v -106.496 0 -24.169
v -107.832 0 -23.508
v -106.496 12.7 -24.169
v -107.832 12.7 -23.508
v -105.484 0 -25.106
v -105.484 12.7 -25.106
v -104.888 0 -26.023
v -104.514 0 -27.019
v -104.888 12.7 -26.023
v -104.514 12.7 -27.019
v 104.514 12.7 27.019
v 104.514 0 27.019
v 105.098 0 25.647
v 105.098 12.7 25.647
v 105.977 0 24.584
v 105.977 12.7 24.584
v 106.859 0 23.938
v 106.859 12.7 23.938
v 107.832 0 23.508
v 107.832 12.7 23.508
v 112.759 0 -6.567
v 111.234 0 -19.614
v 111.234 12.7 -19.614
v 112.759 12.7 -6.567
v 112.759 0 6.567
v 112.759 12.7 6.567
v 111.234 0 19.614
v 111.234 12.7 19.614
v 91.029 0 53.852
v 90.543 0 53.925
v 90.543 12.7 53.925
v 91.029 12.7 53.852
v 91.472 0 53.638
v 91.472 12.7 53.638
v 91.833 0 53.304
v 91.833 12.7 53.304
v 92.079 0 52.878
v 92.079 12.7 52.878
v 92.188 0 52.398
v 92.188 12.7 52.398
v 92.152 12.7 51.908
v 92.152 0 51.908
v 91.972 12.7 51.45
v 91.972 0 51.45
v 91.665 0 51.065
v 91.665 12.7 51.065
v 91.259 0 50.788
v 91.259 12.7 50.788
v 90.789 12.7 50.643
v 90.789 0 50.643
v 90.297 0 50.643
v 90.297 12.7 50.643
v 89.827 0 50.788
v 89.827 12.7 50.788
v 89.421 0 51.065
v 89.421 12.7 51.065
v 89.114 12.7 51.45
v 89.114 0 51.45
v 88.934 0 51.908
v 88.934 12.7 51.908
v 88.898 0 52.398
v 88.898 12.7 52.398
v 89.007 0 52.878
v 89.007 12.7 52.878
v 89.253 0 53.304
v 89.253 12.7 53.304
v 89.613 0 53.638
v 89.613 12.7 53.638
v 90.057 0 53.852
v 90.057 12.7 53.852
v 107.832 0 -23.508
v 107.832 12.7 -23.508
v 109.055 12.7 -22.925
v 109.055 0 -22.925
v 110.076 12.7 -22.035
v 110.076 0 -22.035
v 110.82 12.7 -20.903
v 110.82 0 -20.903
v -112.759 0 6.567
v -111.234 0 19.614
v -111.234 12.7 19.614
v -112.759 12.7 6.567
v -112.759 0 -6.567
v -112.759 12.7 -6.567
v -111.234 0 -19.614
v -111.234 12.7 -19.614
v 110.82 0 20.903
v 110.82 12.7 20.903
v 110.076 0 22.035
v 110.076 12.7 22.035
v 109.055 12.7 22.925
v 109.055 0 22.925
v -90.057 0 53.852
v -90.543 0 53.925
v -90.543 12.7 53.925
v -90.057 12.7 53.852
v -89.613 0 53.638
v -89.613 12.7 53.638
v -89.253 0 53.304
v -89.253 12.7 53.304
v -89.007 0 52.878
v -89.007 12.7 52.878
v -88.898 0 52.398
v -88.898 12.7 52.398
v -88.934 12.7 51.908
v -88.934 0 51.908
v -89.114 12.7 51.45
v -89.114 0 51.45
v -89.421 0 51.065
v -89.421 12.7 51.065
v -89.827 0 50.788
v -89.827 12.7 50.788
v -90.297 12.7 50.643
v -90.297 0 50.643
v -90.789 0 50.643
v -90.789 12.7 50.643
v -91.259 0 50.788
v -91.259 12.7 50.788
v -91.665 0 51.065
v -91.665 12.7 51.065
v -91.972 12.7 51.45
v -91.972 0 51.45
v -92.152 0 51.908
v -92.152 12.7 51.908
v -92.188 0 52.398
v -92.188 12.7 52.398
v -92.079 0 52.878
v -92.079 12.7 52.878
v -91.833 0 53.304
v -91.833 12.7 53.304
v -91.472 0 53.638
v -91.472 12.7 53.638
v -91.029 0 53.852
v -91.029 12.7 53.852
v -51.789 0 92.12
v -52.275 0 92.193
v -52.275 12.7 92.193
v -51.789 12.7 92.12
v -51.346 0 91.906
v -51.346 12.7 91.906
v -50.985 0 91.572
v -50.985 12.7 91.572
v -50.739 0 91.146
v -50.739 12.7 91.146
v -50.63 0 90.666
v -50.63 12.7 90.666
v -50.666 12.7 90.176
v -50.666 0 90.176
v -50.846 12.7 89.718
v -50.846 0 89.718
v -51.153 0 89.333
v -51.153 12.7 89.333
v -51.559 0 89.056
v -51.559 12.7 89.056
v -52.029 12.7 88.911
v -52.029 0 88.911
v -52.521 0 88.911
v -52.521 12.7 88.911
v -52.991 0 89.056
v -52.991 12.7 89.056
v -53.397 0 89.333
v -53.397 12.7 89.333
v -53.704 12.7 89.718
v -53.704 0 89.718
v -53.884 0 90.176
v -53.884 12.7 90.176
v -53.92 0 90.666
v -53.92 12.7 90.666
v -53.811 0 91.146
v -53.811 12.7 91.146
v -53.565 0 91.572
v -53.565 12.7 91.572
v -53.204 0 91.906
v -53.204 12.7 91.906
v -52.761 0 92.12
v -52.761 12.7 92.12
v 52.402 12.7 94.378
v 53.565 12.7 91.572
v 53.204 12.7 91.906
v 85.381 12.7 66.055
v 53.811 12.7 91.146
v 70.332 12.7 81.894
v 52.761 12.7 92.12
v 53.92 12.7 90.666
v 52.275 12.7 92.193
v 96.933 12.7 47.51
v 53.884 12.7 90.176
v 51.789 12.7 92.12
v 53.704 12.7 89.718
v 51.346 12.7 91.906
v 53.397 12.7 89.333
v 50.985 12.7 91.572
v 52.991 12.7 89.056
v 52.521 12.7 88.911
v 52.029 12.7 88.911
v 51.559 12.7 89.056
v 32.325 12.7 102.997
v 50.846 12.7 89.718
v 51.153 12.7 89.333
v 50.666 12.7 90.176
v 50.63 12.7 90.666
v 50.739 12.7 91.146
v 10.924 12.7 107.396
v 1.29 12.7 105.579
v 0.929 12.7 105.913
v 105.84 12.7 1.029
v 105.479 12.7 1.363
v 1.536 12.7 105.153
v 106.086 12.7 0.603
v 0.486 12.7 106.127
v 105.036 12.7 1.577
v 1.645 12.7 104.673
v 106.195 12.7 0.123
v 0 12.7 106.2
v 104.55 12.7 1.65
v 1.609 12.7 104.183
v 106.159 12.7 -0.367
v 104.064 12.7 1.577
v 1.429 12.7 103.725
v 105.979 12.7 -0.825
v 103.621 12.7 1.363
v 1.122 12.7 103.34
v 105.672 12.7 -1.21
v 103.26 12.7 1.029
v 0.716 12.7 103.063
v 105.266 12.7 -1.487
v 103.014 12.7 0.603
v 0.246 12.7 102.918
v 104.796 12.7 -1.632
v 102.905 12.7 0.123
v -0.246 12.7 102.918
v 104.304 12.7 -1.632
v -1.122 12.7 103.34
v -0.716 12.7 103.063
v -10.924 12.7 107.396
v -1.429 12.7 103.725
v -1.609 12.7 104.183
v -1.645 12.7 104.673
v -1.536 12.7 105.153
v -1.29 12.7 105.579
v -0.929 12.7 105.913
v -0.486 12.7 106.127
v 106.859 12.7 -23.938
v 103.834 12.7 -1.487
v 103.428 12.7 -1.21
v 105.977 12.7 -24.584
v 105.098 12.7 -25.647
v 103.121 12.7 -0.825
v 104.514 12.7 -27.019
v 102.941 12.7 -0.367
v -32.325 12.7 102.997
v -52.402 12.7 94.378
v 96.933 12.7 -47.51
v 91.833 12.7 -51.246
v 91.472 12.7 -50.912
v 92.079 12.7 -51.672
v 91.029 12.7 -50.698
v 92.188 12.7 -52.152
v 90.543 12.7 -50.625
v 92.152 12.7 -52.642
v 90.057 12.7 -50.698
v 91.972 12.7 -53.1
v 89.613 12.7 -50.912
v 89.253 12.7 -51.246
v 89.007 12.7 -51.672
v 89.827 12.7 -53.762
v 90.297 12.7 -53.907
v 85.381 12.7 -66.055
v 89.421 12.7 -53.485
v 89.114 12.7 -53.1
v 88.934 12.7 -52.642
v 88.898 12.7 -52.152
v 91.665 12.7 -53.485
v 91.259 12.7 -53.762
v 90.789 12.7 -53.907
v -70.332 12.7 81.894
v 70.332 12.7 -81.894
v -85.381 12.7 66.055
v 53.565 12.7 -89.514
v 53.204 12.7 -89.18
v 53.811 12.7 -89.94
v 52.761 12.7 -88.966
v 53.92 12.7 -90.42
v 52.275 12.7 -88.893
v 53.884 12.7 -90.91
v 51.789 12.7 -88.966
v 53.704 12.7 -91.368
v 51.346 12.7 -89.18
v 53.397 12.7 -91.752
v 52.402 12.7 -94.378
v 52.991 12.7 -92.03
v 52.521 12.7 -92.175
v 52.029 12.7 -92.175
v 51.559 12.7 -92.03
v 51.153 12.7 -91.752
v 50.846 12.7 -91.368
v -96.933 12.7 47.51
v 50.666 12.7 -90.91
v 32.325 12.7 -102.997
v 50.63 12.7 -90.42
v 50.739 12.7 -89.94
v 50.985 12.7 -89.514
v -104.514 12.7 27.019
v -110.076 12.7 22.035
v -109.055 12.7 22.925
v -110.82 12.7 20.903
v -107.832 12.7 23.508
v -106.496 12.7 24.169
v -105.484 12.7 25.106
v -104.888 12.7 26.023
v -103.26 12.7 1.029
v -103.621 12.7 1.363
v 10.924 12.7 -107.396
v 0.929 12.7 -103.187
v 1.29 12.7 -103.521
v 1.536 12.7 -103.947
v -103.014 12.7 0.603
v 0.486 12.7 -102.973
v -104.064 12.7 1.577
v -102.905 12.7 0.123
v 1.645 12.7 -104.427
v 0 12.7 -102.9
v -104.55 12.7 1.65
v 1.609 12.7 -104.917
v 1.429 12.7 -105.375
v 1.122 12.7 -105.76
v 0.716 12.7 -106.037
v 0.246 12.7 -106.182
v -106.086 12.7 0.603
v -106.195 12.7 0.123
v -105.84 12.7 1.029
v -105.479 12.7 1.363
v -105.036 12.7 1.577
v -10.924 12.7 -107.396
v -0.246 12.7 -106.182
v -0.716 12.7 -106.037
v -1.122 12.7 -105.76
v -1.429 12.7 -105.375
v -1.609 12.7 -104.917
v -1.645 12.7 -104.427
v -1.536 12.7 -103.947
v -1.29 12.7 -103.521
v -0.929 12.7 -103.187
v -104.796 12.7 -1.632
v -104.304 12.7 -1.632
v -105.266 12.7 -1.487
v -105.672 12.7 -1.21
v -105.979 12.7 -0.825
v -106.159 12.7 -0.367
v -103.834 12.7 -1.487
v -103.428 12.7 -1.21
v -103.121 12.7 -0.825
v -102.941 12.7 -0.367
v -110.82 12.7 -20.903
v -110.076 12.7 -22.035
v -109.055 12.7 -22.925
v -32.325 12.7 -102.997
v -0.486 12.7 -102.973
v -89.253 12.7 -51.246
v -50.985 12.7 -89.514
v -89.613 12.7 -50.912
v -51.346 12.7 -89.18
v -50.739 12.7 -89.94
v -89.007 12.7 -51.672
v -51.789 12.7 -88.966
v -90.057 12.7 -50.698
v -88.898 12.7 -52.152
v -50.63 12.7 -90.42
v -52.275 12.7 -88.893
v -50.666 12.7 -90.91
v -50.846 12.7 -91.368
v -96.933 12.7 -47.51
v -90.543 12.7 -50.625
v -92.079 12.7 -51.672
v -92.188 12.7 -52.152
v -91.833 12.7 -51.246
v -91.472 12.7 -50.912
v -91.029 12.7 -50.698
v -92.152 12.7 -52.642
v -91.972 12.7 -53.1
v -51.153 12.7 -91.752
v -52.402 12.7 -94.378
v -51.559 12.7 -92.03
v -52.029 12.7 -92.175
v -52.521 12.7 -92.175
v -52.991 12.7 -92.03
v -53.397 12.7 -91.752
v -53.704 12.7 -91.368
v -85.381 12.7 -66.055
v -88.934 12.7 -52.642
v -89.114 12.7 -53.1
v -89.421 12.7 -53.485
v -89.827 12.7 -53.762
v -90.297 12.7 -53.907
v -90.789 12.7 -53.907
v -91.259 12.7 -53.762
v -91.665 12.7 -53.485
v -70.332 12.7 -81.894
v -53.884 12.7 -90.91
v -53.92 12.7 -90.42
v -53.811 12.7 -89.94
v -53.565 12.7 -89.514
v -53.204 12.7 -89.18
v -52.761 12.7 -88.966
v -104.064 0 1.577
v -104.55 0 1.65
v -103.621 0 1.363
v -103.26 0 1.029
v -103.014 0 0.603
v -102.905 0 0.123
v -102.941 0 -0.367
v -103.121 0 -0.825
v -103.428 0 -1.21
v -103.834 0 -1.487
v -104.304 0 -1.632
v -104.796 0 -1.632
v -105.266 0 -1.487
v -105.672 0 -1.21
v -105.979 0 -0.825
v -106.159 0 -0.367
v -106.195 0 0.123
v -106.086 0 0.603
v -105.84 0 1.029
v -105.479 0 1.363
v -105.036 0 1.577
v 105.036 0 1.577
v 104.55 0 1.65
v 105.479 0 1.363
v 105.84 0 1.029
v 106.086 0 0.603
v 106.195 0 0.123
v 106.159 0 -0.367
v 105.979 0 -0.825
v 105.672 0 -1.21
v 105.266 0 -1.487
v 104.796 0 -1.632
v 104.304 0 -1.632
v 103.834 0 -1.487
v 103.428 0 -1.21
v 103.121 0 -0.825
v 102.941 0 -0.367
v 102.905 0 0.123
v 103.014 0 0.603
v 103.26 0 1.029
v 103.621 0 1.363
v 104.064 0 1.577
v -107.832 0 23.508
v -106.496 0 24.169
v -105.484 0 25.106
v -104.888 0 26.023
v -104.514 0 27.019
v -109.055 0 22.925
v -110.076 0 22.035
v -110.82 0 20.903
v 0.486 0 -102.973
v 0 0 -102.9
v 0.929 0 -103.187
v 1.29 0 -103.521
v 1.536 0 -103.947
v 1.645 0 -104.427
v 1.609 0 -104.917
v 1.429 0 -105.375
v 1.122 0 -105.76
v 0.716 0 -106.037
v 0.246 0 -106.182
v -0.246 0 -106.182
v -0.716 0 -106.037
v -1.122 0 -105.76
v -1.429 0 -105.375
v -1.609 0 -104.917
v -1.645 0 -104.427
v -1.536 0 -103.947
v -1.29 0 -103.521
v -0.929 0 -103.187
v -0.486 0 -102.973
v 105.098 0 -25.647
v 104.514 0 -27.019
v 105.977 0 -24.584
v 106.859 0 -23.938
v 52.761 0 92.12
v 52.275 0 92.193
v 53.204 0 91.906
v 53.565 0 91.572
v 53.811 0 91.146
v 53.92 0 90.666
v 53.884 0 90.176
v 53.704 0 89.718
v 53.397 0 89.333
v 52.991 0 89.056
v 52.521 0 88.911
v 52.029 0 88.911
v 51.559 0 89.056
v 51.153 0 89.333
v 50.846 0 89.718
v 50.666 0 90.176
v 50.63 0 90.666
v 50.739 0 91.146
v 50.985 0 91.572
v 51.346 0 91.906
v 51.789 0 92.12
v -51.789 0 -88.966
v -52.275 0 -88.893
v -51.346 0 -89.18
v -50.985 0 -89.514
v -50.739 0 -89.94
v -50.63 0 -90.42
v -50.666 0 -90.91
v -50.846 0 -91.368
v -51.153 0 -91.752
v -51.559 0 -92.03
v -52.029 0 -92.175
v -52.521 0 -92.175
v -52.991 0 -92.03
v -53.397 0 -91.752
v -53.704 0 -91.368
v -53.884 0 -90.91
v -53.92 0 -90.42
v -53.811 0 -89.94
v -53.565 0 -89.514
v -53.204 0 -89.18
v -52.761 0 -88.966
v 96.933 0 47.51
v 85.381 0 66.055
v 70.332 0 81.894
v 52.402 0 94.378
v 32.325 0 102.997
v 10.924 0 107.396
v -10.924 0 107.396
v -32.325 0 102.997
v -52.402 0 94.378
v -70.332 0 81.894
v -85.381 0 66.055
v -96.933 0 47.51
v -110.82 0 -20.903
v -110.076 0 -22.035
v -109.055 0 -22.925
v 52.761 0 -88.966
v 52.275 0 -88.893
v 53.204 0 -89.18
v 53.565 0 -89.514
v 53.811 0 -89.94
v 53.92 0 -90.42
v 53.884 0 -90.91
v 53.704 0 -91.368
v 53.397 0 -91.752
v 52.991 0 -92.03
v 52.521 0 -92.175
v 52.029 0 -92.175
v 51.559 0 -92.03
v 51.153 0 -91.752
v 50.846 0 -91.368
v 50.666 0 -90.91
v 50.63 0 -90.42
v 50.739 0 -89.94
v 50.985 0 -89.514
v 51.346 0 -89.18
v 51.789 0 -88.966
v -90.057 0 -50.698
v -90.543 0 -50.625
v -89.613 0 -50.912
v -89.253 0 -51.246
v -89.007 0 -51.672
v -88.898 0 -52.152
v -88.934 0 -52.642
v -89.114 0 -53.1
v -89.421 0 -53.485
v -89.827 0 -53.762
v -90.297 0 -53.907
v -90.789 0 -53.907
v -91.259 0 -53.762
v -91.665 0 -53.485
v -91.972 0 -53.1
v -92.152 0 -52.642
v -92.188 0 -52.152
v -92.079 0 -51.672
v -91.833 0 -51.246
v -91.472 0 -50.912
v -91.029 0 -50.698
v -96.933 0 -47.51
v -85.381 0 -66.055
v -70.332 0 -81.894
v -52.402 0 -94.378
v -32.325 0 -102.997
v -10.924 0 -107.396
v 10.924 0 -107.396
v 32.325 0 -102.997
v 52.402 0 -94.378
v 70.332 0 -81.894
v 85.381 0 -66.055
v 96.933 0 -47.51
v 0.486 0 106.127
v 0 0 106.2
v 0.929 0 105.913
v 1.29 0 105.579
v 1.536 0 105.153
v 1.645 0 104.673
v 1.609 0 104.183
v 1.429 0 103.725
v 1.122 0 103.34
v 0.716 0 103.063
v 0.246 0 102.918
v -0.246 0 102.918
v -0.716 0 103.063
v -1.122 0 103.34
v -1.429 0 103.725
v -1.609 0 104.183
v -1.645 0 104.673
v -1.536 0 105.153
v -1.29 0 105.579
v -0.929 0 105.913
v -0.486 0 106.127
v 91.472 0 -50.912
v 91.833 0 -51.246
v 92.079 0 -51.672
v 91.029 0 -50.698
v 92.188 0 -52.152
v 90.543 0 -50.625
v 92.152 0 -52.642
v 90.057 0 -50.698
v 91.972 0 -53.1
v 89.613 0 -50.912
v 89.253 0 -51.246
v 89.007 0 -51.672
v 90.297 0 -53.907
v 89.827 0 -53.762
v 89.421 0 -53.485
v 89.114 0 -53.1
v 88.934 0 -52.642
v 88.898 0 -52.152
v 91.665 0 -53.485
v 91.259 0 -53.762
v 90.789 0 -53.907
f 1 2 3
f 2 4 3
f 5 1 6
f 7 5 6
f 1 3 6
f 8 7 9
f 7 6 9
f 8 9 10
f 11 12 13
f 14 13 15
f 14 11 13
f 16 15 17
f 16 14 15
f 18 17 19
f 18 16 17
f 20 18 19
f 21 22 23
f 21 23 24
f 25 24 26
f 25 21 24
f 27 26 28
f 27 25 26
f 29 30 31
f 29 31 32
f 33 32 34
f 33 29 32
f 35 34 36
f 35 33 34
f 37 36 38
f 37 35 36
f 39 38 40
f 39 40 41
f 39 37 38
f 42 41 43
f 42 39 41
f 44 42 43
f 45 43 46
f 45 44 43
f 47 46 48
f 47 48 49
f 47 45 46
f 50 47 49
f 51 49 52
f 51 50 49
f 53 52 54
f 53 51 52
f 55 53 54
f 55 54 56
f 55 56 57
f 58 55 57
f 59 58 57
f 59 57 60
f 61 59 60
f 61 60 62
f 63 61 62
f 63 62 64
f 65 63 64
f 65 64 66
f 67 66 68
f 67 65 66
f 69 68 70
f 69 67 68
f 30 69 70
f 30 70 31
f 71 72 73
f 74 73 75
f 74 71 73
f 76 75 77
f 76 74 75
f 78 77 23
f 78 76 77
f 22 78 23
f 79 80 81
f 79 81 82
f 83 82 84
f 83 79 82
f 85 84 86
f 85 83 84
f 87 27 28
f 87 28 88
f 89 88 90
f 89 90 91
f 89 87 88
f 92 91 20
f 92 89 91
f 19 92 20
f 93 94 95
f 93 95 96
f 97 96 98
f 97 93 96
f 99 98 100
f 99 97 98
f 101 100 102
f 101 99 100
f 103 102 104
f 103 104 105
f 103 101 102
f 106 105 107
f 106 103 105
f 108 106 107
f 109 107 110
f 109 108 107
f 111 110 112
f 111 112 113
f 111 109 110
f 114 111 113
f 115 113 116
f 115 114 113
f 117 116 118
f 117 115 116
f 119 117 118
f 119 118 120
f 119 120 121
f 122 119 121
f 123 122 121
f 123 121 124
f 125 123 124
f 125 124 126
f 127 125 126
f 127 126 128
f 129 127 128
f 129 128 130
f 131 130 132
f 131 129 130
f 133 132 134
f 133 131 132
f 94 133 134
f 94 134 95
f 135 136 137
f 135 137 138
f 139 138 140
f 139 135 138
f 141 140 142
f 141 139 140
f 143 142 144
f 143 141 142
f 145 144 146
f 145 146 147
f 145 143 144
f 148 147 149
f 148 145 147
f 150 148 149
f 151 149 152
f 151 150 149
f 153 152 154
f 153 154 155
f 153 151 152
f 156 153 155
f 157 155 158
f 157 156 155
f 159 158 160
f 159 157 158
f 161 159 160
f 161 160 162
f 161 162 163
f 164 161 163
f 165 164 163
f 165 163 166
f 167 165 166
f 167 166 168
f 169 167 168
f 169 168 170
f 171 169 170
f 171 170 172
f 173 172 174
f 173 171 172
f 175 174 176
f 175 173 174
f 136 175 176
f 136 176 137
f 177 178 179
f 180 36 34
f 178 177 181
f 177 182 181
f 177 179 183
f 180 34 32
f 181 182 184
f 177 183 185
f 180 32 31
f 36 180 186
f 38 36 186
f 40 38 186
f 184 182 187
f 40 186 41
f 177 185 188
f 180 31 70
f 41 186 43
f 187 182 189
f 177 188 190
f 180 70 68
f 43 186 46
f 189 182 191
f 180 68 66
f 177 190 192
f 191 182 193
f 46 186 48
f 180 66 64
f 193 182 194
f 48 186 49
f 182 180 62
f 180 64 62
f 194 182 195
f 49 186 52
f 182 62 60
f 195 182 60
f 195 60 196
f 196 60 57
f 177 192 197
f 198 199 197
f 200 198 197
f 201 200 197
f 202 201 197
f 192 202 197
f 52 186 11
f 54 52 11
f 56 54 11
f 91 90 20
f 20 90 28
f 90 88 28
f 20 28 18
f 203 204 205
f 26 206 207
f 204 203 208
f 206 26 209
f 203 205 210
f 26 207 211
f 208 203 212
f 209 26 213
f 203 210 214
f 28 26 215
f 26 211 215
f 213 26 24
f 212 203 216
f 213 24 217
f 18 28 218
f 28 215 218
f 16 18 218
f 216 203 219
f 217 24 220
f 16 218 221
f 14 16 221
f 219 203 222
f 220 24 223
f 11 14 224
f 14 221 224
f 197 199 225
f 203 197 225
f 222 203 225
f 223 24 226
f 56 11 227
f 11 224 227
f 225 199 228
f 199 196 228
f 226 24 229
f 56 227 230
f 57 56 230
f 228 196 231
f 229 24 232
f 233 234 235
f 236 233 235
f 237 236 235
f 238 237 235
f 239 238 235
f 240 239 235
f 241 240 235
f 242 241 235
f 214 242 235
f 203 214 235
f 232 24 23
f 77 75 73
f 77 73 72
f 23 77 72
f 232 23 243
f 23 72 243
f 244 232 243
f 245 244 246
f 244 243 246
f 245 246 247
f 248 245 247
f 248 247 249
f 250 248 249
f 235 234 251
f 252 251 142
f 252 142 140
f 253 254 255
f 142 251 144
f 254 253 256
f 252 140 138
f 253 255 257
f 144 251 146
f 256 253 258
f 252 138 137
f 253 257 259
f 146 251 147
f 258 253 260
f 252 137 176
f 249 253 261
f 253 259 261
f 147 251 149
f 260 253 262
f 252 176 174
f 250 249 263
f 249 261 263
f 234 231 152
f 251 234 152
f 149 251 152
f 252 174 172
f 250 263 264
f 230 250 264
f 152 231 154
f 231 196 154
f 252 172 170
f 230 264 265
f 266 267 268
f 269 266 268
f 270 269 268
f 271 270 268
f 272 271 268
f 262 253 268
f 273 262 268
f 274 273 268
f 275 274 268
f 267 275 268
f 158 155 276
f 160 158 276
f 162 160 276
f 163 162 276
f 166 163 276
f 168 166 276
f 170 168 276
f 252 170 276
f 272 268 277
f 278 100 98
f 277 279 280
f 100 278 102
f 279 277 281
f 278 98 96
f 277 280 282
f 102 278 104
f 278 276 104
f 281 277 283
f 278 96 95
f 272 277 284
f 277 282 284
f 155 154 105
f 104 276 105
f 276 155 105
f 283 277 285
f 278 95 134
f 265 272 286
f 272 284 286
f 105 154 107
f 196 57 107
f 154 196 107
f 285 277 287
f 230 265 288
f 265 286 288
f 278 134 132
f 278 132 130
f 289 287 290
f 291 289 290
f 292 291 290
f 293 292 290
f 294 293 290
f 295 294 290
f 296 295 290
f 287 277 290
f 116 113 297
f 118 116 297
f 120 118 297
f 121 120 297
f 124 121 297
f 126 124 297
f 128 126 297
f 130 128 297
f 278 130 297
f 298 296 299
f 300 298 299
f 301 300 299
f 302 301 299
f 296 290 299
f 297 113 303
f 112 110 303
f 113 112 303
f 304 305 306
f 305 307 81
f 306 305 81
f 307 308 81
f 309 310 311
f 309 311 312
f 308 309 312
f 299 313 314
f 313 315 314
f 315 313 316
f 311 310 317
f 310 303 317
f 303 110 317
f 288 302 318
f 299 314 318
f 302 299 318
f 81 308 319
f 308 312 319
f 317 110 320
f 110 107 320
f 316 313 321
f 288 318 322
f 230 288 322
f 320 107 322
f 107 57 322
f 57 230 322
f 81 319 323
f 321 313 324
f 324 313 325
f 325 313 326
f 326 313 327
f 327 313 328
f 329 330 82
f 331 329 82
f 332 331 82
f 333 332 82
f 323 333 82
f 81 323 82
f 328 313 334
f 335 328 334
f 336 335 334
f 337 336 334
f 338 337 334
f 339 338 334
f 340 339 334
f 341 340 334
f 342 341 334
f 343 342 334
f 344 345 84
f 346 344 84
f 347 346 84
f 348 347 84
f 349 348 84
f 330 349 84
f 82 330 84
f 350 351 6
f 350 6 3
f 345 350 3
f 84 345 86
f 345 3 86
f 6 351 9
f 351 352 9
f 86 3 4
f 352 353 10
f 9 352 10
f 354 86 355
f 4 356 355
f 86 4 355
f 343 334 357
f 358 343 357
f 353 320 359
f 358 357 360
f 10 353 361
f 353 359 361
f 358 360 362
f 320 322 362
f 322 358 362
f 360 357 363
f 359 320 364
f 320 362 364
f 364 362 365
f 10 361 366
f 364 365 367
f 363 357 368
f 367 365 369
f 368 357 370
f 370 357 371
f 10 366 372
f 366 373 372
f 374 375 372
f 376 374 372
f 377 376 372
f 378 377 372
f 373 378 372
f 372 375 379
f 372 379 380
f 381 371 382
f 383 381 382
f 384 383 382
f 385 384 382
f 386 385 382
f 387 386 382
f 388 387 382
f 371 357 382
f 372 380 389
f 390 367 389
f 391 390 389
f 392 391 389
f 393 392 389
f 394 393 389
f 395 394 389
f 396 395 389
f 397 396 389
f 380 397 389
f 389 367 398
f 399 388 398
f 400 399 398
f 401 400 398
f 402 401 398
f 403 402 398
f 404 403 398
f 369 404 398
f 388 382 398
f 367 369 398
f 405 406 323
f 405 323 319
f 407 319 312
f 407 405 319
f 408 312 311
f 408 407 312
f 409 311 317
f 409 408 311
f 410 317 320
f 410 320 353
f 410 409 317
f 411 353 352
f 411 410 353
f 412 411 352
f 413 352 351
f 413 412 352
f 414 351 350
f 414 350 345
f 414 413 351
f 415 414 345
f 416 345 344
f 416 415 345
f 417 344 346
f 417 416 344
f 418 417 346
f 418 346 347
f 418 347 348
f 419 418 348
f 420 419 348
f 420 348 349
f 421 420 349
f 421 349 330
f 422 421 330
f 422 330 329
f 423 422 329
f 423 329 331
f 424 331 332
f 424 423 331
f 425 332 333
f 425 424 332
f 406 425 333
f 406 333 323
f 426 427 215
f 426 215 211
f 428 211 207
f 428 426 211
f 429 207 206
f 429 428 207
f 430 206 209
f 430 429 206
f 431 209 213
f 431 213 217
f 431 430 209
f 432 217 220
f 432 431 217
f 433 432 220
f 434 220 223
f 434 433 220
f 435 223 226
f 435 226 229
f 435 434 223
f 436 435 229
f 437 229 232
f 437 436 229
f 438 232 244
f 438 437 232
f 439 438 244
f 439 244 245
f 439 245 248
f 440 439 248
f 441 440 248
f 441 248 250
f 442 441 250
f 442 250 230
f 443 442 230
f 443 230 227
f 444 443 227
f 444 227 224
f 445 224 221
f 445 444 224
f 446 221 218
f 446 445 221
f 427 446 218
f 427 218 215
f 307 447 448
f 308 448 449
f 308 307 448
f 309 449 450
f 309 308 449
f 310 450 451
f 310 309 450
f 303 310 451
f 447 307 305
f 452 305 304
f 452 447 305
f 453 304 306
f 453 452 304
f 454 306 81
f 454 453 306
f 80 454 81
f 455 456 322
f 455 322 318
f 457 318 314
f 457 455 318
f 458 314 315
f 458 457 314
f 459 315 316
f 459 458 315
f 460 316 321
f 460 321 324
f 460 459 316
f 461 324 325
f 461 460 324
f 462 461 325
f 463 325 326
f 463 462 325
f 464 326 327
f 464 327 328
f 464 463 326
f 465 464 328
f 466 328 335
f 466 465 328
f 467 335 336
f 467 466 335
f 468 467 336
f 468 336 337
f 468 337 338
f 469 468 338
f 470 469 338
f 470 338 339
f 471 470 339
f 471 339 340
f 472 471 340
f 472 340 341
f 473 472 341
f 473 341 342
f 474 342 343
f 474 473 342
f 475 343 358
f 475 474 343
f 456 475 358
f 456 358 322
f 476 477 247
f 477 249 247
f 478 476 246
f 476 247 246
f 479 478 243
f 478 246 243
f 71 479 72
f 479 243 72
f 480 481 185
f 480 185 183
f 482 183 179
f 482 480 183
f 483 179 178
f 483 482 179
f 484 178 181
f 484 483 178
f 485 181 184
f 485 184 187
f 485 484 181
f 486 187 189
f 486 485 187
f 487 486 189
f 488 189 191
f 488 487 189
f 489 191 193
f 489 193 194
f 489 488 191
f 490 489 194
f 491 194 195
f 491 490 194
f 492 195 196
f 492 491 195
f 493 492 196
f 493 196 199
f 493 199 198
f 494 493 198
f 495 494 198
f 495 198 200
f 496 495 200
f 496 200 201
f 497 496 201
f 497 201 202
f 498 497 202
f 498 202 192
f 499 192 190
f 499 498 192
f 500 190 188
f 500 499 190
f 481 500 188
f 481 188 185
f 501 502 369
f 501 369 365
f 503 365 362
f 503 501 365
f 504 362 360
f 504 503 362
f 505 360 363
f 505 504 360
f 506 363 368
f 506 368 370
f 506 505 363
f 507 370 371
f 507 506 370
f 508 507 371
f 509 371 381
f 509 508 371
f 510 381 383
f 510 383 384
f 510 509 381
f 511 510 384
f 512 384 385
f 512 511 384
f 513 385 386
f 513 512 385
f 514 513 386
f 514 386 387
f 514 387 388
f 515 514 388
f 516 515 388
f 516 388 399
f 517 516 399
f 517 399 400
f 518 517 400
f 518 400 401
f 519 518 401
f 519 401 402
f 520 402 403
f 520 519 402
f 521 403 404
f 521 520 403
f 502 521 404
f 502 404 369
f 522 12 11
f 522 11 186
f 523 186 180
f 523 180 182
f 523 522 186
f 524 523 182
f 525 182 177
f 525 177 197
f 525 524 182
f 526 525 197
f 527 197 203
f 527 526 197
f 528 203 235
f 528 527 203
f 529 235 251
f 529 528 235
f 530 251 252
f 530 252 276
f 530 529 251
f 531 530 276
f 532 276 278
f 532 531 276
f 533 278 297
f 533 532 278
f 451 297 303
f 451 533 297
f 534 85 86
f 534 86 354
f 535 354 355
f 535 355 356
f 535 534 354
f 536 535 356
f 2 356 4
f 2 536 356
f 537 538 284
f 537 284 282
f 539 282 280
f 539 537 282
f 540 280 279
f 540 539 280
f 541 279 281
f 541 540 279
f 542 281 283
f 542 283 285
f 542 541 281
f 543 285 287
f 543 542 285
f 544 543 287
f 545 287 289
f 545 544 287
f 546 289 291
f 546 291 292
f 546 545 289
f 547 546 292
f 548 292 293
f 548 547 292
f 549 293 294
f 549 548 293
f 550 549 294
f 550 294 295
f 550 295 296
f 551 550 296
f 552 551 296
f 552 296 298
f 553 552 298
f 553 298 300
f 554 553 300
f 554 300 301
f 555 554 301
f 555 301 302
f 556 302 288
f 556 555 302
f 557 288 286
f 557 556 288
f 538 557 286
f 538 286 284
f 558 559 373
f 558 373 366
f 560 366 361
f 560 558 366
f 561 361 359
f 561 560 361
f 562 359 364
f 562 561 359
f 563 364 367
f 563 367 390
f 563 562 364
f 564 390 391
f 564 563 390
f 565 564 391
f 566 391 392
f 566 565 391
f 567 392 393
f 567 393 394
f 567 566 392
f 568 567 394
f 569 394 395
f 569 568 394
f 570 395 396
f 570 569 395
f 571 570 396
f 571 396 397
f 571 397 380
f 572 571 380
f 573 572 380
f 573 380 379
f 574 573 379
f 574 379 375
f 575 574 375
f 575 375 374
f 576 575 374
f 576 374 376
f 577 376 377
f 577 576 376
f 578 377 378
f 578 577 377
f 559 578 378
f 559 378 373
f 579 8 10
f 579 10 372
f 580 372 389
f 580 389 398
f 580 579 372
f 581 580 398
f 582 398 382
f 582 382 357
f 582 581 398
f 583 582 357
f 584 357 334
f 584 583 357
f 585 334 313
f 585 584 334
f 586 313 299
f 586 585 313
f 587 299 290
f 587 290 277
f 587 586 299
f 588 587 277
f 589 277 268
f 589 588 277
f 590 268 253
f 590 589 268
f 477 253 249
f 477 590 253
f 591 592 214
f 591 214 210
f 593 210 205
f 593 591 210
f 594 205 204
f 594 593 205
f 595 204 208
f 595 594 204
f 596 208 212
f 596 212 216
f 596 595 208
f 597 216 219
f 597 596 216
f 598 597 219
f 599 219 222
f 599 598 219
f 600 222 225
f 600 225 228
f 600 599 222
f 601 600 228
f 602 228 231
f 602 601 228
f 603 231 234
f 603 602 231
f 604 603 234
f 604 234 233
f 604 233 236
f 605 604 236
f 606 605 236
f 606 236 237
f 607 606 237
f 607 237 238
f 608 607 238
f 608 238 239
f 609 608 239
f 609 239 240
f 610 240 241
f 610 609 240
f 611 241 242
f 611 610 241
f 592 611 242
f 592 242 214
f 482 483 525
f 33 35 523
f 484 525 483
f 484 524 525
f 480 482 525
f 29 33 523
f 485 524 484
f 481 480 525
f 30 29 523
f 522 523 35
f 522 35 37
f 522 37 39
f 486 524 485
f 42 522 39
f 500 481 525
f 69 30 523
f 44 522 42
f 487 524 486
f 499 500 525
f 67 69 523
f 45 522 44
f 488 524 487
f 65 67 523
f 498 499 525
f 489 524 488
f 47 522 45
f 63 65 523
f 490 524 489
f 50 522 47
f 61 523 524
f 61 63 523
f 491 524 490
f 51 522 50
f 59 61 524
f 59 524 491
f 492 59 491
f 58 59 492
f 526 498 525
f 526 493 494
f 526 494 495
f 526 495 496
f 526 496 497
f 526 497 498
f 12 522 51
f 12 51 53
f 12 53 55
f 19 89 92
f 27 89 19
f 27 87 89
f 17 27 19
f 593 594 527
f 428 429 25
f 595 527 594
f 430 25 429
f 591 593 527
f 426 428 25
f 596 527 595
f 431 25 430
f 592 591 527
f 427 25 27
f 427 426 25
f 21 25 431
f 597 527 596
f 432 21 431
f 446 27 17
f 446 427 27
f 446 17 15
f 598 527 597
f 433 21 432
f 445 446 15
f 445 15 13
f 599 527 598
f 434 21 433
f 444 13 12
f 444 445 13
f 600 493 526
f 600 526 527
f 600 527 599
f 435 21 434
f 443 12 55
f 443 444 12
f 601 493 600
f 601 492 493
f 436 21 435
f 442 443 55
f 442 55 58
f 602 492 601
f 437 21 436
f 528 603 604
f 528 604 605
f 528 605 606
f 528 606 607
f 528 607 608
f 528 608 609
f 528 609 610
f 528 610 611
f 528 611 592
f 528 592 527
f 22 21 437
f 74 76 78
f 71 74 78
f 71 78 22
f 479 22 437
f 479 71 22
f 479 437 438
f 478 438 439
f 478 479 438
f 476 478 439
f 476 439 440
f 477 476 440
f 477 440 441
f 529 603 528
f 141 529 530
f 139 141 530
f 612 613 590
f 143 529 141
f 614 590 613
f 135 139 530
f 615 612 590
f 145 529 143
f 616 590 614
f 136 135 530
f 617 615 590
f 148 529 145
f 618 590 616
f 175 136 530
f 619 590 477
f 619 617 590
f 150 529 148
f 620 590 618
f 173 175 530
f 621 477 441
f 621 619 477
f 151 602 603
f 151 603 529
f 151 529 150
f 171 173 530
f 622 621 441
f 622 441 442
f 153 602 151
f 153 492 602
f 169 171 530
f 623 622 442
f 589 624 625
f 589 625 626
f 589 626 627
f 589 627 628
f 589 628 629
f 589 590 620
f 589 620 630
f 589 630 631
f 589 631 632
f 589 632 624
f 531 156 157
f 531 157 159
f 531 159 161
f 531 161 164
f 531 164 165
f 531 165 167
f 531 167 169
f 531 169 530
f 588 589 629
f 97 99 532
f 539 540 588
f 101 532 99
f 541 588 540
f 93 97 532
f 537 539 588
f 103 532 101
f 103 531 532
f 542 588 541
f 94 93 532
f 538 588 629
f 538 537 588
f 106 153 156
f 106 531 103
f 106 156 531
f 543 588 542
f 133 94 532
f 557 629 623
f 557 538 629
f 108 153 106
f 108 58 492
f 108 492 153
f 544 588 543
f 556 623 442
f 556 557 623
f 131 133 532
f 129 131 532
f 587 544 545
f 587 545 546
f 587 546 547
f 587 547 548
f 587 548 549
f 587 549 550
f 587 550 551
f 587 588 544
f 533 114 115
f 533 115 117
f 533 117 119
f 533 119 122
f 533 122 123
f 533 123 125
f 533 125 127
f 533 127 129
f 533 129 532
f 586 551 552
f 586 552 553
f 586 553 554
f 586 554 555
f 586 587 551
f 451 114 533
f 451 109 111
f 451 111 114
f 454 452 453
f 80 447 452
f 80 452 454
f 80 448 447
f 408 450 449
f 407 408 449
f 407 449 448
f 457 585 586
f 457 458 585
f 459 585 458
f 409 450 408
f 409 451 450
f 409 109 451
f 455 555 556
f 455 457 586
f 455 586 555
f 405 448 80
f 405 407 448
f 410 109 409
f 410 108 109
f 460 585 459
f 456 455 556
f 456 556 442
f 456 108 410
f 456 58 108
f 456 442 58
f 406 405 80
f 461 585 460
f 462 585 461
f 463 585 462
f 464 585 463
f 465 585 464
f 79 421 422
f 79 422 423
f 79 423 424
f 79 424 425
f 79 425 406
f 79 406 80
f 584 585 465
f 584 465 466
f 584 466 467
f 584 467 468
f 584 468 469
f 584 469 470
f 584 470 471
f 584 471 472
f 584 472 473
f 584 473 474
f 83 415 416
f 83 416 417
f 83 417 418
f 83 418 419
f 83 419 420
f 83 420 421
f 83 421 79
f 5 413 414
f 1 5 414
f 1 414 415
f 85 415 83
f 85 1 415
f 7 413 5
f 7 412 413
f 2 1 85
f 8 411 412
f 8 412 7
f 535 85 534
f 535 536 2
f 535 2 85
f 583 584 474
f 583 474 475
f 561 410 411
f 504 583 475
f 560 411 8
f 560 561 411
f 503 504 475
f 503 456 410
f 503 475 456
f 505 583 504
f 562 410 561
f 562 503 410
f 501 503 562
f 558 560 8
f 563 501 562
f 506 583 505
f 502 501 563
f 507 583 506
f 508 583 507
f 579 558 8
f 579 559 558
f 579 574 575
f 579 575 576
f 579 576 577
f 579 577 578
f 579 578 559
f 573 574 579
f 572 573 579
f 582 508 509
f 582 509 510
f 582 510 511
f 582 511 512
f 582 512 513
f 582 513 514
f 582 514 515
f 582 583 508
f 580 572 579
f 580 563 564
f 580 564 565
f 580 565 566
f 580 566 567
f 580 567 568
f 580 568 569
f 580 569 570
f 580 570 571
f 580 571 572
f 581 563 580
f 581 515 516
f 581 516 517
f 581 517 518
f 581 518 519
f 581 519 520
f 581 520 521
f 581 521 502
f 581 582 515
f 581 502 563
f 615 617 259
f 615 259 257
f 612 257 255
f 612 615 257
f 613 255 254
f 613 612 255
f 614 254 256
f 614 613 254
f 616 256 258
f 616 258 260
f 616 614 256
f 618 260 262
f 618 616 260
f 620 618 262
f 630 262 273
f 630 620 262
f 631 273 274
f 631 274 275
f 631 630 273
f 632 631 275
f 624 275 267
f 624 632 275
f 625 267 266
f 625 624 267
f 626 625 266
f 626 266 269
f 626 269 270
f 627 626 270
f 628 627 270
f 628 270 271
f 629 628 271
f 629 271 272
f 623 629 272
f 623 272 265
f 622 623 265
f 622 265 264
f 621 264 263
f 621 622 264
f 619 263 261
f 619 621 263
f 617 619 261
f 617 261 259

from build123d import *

# Parameters (mm, degrees)
SKETCH1_R           = 1.65
BOSS_EXTRUDE1_DEPTH = 12.7
FILLET1_R           = 5


with BuildPart() as part:
    # Sketch1 → Boss-Extrude1 (new body)
    with BuildSketch(Plane(origin=(0, 0, 0), x_dir=(1, 0, 0), z_dir=(0, 1, 0))):
        with BuildLine():
            ThreePointArc((-111.234035703, -19.613561667), (-112.95, 0), (-111.234035703, 19.613561667))
            ThreePointArc((-111.234035703, 19.613561667), (-109.13025705, 22.87401705), (-105.327953741, 23.647931427))
            ThreePointArc((-105.327953741, 23.647931427), (0, 107.95), (105.327953741, 23.647931427))
            ThreePointArc((105.327953741, 23.647931427), (109.13025705, 22.87401705), (111.234035703, 19.613561667))
            ThreePointArc((111.234035703, 19.613561667), (112.95, 0), (111.234035703, -19.613561667))
            ThreePointArc((111.234035703, -19.613561667), (109.13025705, -22.87401705), (105.327953741, -23.647931427))
            ThreePointArc((105.327953741, -23.647931427), (0, -107.95), (-105.327953741, -23.647931427))
            ThreePointArc((-105.327953741, -23.647931427), (-109.13025705, -22.87401705), (-111.234035703, -19.613561667))
        make_face()
        with Locations(Location((0, 104.55, 0), (0, 0, 270))):
            Circle(SKETCH1_R, mode=Mode.SUBTRACT)
        with Locations(Location((52.275, 90.542955966, 0), (0, 0, 270))):
            Circle(SKETCH1_R, mode=Mode.SUBTRACT)
        with Locations(Location((90.542955966, 52.275, 0), (0, 0, 270))):
            Circle(SKETCH1_R, mode=Mode.SUBTRACT)
        with Locations(Location((104.55, 0, 0), (0, 0, 270))):
            Circle(SKETCH1_R, mode=Mode.SUBTRACT)
        with Locations(Location((90.542955966, -52.275, 0), (0, 0, 270))):
            Circle(SKETCH1_R, mode=Mode.SUBTRACT)
        with Locations(Location((52.275, -90.542955966, 0), (0, 0, 270))):
            Circle(SKETCH1_R, mode=Mode.SUBTRACT)
        with Locations(Location((0, -104.55, 0), (0, 0, 270))):
            Circle(SKETCH1_R, mode=Mode.SUBTRACT)
        with Locations(Location((-52.275, -90.542955966, 0), (0, 0, 270))):
            Circle(SKETCH1_R, mode=Mode.SUBTRACT)
        with Locations(Location((-90.542955966, -52.275, 0), (0, 0, 270))):
            Circle(SKETCH1_R, mode=Mode.SUBTRACT)
        with Locations(Location((-104.55, 0, 0), (0, 0, 270))):
            Circle(SKETCH1_R, mode=Mode.SUBTRACT)
        with Locations(Location((-90.542955966, 52.275, 0), (0, 0, 270))):
            Circle(SKETCH1_R, mode=Mode.SUBTRACT)
        with Locations(Location((-52.275, 90.542955966, 0), (0, 0, 270))):
            Circle(SKETCH1_R, mode=Mode.SUBTRACT)
    extrude(amount=BOSS_EXTRUDE1_DEPTH)

    # Fillet1
    fillet1_edges = [part.edges().sort_by_distance(p)[0] for p in [
        (-105.327953741, 6.35, -23.647931427),
        (105.327953741, 6.35, -23.647931427),
        (105.327953741, 6.35, 23.647931427),
        (-105.327953741, 6.35, 23.647931427),
    ]]
    fillet(fillet1_edges, radius=FILLET1_R)


solid = part.part
